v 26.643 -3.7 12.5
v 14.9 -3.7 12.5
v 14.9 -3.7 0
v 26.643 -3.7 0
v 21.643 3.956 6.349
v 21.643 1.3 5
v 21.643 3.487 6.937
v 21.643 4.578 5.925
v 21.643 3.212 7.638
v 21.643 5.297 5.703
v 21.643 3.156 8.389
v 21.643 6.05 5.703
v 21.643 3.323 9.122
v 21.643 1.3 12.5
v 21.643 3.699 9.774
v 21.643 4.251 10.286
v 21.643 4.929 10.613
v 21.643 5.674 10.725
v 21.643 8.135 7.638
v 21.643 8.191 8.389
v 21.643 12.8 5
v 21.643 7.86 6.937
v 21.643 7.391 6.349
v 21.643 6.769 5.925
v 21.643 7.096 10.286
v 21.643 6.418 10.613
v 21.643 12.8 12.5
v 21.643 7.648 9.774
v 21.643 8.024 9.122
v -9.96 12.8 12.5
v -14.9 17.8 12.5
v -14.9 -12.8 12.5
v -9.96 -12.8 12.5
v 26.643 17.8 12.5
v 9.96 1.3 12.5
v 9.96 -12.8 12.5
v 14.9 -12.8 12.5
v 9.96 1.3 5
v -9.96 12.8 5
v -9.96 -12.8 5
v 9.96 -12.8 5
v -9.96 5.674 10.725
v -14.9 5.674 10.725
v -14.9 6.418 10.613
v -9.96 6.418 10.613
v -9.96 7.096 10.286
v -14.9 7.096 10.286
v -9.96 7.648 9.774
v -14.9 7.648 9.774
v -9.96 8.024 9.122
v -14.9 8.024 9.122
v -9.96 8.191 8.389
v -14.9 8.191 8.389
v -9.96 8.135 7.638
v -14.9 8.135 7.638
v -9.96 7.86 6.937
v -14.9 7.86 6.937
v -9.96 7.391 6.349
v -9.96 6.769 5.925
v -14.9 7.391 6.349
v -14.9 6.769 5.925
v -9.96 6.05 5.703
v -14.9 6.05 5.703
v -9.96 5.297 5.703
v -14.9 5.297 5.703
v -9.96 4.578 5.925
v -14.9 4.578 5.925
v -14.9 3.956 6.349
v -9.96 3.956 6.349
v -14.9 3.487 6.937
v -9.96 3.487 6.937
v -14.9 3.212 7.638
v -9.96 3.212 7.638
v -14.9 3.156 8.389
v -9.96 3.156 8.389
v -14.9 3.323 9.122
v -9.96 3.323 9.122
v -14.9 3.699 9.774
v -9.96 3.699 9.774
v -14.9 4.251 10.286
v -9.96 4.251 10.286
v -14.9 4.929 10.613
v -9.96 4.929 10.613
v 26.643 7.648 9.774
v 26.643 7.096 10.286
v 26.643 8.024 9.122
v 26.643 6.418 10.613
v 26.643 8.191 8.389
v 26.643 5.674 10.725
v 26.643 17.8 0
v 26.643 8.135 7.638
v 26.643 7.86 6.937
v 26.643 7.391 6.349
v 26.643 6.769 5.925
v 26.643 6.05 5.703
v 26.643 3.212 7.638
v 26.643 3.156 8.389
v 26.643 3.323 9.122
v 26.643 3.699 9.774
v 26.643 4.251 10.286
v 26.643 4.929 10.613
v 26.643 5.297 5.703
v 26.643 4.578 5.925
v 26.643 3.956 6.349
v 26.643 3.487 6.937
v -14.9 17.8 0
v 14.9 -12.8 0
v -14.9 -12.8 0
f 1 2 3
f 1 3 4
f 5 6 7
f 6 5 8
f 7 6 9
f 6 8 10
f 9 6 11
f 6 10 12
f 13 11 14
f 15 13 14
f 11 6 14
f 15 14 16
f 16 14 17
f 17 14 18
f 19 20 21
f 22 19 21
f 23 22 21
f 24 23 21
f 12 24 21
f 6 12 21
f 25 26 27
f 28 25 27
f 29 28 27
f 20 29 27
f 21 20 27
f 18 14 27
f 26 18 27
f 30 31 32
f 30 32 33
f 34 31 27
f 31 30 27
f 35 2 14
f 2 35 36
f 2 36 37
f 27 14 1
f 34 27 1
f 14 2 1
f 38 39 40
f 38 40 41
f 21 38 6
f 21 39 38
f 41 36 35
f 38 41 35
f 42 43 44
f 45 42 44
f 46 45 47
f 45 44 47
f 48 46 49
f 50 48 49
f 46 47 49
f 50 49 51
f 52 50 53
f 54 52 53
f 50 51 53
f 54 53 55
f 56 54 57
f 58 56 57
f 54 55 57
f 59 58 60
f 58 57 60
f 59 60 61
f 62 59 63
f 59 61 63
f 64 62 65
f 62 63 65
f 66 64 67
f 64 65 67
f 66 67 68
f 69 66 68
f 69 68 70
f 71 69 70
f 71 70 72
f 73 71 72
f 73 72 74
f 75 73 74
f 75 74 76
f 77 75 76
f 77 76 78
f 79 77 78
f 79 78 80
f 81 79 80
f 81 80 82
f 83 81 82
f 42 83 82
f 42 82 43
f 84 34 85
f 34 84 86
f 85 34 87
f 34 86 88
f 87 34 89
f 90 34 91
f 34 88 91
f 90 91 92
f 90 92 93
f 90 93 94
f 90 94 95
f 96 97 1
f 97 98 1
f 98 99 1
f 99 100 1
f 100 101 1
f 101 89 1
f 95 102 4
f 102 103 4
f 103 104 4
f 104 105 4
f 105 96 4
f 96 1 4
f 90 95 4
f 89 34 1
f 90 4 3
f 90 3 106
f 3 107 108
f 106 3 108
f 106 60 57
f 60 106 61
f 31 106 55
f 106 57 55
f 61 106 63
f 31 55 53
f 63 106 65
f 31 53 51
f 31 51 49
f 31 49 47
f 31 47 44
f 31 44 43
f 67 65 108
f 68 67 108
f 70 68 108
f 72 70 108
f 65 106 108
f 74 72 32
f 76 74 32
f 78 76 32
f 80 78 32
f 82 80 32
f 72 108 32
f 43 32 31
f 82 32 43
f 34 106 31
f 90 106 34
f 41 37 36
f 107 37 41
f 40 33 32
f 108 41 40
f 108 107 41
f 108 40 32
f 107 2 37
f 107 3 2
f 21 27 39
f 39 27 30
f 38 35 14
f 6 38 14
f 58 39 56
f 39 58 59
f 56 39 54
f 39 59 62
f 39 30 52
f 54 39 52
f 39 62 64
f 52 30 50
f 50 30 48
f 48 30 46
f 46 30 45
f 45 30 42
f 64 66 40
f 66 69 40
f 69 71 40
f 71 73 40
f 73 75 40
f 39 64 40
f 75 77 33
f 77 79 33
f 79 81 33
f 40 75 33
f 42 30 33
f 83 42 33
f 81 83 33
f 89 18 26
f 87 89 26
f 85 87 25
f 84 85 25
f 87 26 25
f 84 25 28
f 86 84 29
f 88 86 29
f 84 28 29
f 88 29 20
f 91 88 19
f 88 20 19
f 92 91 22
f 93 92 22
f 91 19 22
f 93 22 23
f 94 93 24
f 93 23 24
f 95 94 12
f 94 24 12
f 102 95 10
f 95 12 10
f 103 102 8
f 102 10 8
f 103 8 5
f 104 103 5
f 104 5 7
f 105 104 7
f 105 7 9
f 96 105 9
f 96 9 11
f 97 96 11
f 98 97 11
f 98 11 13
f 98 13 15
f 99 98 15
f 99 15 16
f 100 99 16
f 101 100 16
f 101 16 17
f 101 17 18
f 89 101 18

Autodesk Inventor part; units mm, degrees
ref_plane "YZ Plane" through (0, 0, 0) normal (1, 0, 0) x (0, 1, 0)
ref_plane "XZ Plane" through (0, 0, 0) normal (0, 1, 0) x (-1, 0, 0)
ref_plane "XY Plane" through (0, 0, 0) normal (0, 0, 1) x (1, 0, 0)
sketch "Sketch1" plane through (0, 0, 0) normal (0, 0, 1) x (1, 0, 0)
  line L0 (4.1434, -12.66) -> (3.2904, -12.66)
  line L1 (-14.9, 12.8) -> (14.9, 12.8)
  line L2 (14.9, 12.8) -> (14.9, -12.8)
  line L3 (14.9, -12.8) -> (-14.9, -12.8)
  line L4 (-14.9, -12.8) -> (-14.9, 12.8)
  point P0 (0, 0)
  point P1 (0, 12.8)
  point P2 (-14.9, 0)
  dimension "d4" = 29.8
  dimension "d5" = 25.6
extrude "Extrusion1" add sketch "Sketch1" along normal blind 12.5
sketch "Sketch2" plane through (0, 0, 12.5) normal (0, 0, 1) x (1, 0, 0)
  line L0 (-14.9, -12.8) -> (14.9, -12.8) projected
  line L1 (-9.96, -12.8) -> (9.96, -12.8)
  line L2 (9.96, -12.8) -> (9.96, 7.8)
  line L3 (9.96, 7.8) -> (-9.96, 7.8)
  line L4 (-9.96, 7.8) -> (-9.96, -12.8)
  line L5 (14.9, 12.8) -> (-14.9, 12.8) projected
  point P0 (0, 0)
  point P1 (0, 7.8)
  dimension "d8" = 19.92
  dimension "d9" = 5
extrude "Extrusion2" cut sketch "Sketch2" against normal blind 7.5
sketch "Sketch3" plane through (0, 0, 12.5) normal (0, 0, 1) x (1, 0, 0)
  line L0 (-0.14, 0.6) -> (-0.84, 1.3) projected
  line L1 (14.9, -12.8) -> (14.9, 12.8) projected
  line L2 (14.9, -3.7) -> (26.6432, -3.7)
  line L3 (26.6432, -3.7) -> (26.6432, 12.8)
  line L4 (26.6432, 12.8) -> (14.9, 12.8)
  line L5 (14.9, 12.8) -> (14.9, -3.7)
  line L6 (14.9, 12.8) -> (-14.9, 12.8) projected
  line L7 (-7.482, 1.9485) -> (17.86, 10.1145) projected
  line L8 (-7.482, 1.9485) -> (19.1432, 1.9485)
  line L9 (9.96, 7.8) -> (9.96, -12.8) projected
  line L10 (9.96, 1.3) -> (21.6432, 1.3)
  line L11 (21.6432, 1.3) -> (21.6432, 7.8)
  line L12 (21.6432, 7.8) -> (9.96, 7.8)
  line L13 (9.96, 7.8) -> (9.96, 1.3)
  line L14 (-9.96, 7.8) -> (9.96, 7.8) projected
  point P0 (0, 0)
  point P1 (15.8016, 1.3)
  point P2 (21.6432, 4.55)
  dimension "d12" = 5
  dimension "d13" = 7.5
  dimension "d14" = 5
extrude "Extrusion3" add sketch "Sketch3" against normal blind 12.5 contours L1 L10 L11 L12 L4 L3 L2 | L1 L12 L11 L10
sketch "Sketch4" plane through (0, 0, 12.5) normal (0, 0, 1) x (1, 0, 0)
  line L0 (21.6432, 7.8) -> (9.96, 7.8) projected
  line L1 (9.96, 7.8) -> (9.96, 1.3) projected
  line L2 (9.96, 1.3) -> (21.6432, 1.3) projected
  line L3 (21.6432, 1.3) -> (21.6432, 7.8) projected
  point P0 (0, 0)
extrude "Extrusion4" cut sketch "Sketch4" against normal blind 7.5
thicken "Thicken1" operation add thickness 5 both sides no extend neighbours no toward (0, 1, 0) faces at (12.7954, 12.8, 4.1667)
sketch "Sketch5" plane through (0, 0, 12.5) normal (0, 0, 1) x (1, 0, 0)
  line L0 (-9.96, 7.8) -> (21.6432, 7.8) projected
  line L1 (-9.96, 7.8) -> (21.6432, 7.8)
  line L2 (21.6432, 7.8) -> (21.6432, 12.8)
  line L3 (21.6432, 12.8) -> (-9.96, 12.8)
  line L4 (-9.96, 12.8) -> (-9.96, 7.8)
  line L5 (21.6432, 7.8) -> (21.6432, 1.3) projected
  point P0 (0, 0)
  dimension "d21" = 5
extrude "Extrusion5" cut sketch "Sketch5" against normal blind 7.5
sketch "Sketch6" plane through (-14.9, -12.8, 0) normal (-1, 0, 0) x (0, 0, 1)
  circle A0 centre (8.2, 18.4735) radius 2.525
  line L0 (10, 14.7485) -> (6.4, 14.7485) projected
  line L1 (6.6, 15.3) -> (9.8, 15.3)
  point P0 (0, 12.8)
  point P1 (8.2, 14.7485)
  point P2 (8.2, 15.9485)
  dimension "d24" = 5.05
  dimension "d25" = 1.2
extrude "Extrusion6" cut sketch "Sketch6" against normal through all
properties part number "SS-5FL111-3T_Housing_01"
